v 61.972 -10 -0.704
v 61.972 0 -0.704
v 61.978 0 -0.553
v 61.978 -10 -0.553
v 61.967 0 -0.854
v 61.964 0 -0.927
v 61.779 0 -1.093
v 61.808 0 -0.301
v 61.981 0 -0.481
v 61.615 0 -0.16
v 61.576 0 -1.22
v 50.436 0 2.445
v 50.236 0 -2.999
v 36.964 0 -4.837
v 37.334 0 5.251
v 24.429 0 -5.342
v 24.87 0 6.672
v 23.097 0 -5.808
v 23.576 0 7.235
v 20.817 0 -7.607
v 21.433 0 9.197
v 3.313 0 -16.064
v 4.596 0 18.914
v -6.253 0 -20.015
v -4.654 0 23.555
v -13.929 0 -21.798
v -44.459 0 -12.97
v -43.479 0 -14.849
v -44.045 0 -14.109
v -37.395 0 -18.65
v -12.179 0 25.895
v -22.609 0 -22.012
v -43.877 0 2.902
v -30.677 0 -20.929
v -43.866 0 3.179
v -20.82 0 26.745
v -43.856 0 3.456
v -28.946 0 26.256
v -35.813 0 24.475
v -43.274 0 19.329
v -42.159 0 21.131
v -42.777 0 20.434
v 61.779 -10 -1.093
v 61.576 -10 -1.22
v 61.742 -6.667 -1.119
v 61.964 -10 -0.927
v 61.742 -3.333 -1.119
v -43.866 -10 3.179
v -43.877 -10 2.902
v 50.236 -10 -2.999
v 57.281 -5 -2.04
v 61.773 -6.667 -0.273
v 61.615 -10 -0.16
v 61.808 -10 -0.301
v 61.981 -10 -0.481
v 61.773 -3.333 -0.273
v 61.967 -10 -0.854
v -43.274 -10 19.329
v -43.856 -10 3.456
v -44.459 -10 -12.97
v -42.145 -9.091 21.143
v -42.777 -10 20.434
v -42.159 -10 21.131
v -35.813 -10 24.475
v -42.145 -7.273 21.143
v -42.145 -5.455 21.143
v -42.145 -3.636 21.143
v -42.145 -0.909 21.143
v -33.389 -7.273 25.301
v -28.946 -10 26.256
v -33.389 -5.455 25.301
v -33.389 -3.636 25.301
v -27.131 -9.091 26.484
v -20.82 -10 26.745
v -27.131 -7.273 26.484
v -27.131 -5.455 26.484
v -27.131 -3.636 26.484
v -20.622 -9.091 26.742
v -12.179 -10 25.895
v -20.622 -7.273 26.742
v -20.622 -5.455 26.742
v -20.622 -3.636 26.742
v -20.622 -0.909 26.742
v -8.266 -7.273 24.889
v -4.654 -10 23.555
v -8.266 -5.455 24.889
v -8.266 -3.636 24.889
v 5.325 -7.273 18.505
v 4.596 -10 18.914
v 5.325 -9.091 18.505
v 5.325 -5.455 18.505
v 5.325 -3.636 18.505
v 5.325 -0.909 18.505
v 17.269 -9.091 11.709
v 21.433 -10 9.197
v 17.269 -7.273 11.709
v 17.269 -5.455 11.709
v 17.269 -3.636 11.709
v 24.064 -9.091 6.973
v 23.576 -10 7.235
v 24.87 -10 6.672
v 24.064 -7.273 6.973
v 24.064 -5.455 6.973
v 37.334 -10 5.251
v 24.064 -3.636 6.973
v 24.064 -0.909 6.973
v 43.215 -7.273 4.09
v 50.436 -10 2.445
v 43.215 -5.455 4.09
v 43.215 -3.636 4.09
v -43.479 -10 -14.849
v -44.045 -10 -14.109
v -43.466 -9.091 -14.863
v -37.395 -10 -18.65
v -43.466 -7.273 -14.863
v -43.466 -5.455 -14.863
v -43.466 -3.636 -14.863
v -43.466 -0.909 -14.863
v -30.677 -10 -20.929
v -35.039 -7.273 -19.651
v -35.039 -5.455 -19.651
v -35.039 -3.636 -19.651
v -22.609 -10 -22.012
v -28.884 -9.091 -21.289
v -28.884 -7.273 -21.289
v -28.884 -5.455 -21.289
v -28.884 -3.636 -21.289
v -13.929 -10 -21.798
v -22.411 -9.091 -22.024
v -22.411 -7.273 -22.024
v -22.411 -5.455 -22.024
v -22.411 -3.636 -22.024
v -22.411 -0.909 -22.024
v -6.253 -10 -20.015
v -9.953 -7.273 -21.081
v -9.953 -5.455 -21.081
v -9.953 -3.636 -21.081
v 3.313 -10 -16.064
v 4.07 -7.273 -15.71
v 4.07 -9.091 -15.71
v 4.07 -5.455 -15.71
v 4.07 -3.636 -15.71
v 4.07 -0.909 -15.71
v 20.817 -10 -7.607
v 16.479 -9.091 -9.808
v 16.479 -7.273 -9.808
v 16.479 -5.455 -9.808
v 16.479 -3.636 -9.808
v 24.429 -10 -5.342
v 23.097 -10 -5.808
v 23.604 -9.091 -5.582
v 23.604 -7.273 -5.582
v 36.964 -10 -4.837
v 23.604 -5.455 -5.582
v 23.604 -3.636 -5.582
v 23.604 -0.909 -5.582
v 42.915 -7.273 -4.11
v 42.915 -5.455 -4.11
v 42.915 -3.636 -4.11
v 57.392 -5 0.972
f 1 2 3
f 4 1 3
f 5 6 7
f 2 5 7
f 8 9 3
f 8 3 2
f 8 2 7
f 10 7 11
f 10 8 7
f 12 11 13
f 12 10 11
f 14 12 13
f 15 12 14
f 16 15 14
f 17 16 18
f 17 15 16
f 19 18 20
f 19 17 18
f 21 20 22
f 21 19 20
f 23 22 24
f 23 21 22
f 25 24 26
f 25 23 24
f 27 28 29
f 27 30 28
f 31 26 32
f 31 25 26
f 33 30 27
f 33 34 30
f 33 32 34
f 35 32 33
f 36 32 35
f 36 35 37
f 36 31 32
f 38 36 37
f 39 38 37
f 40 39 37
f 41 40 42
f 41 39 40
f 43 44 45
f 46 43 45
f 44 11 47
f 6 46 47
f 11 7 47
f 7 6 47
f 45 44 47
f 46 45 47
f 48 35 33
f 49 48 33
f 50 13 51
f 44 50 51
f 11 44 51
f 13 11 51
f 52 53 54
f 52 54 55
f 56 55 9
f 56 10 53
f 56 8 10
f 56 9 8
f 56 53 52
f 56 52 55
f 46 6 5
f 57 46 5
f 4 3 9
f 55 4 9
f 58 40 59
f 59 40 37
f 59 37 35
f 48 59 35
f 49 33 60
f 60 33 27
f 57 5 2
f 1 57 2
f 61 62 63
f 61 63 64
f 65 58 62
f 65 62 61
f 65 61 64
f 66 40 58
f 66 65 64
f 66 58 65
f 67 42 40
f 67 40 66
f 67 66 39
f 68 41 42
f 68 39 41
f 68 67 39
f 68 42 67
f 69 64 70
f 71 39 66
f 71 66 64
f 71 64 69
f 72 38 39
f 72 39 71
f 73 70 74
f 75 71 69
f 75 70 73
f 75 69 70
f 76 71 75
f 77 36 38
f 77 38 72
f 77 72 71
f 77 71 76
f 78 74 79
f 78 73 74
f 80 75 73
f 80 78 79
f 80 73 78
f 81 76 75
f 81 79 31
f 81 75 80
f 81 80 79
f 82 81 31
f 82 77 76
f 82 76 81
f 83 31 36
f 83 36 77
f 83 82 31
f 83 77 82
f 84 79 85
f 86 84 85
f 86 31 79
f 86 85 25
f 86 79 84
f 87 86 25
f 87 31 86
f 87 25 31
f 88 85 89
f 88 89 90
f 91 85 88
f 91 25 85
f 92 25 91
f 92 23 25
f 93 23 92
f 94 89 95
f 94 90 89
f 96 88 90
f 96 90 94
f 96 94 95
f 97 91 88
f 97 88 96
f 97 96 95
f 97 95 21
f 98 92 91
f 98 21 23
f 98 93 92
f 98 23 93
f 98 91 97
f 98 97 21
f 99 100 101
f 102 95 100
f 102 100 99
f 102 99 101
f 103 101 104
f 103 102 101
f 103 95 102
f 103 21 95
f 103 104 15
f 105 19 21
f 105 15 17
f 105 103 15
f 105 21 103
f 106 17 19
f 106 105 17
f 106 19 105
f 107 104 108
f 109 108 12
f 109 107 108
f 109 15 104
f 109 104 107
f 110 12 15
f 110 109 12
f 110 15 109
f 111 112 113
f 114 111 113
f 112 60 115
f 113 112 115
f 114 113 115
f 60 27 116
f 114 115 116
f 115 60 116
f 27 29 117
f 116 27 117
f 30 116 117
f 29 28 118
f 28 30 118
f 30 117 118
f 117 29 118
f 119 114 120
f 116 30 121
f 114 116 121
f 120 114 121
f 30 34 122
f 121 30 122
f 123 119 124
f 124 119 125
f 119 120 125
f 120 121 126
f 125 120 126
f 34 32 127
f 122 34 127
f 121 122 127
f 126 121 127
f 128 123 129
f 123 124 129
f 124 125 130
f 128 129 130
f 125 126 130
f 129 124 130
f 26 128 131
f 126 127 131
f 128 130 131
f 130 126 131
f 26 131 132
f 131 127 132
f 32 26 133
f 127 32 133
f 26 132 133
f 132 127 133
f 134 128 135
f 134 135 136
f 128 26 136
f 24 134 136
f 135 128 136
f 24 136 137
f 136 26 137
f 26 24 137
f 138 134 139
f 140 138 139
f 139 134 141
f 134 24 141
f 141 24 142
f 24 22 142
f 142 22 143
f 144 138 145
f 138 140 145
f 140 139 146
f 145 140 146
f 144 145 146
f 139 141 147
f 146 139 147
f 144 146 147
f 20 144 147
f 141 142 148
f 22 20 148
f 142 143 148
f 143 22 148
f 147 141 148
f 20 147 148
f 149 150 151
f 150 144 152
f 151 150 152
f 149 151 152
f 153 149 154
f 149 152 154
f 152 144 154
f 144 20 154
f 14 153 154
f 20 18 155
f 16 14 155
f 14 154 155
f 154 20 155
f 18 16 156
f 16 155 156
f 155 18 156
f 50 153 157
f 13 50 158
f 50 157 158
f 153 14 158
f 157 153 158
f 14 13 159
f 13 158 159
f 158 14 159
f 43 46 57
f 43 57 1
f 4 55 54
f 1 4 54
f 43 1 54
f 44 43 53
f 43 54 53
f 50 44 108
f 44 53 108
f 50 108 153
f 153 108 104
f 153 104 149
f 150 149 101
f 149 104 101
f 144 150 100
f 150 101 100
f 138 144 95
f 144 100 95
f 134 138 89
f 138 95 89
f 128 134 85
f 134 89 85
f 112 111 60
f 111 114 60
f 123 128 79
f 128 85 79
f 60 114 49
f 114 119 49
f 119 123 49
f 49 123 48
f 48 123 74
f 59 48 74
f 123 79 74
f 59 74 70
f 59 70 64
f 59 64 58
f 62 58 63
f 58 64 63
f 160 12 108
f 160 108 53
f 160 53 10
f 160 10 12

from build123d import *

# Parameters (mm, degrees)
F1_DEPTH = 10


with BuildPart() as f1:
    # F0 (on Front) → F1 (new body)
    with BuildSketch(Plane.XZ):
        with BuildLine():
            add(Edge.make_bspline(
                [(-43.2739737539, 19.3286379981), (-42.8717910323, 20.6443938488), (-41.2670866914, 21.9607246818), (-33.1050259673, 26.1698144492), (-20.4782941502, 27.1660016518), (-7.9180102102, 25.6432503479), (5.0492344453, 18.8178845805), (16.8426971438, 11.7818486723), (21.5410823221, 9.5845389909), (23.7573944562, 6.0271395456), (33.9663222046, 6.0122157554), (41.6732644409, 4.4779816736), (47.9916737559, 2.9982979686), (50.4361293155, 2.4450533648)],
                knots=[0.2096114324, 0.2096114324, 0.2096114324, 0.2096114324, 0.2372253632, 0.282305002, 0.3374939232, 0.3919156422, 0.4515775986, 0.5086523402, 0.5423950946, 0.5712274702, 0.6183035523, 0.6670425092, 0.6989923434, 0.6989923434, 0.6989923434, 0.6989923434], degree=3))
            Line((-43.2739737539, 19.3286379981), (-43.8562949661, 3.456262298))
            Line((-43.8562949661, 3.456262298), (-43.866463093, 3.1791088515))
            Line((-43.866463093, 3.1791088515), (61.9723973752, -0.7038772044))
            Line((61.9723973752, -0.7038772044), (61.9779187996, -0.5533792985))
            add(Edge.make_bspline(
                [(61.9779187996, -0.5533792985), (61.9043423038, -0.4347153333), (61.7777869789, -0.2956526047), (61.614568699, -0.1598779548)],
                knots=[0.7844933866, 0.7844933866, 0.7844933866, 0.7844933866, 0.7922828741, 0.7922828741, 0.7922828741, 0.7922828741], degree=3))
            add(Edge.make_bspline(
                [(50.4361293155, 2.4450533648), (52.1557640437, 2.0558547843), (56.6990812586, 1.0537255108), (60.587418179, 0.4072656539), (61.5305184171, -0.106596957), (61.614568699, -0.1598779548)],
                knots=[0.6989923434, 0.6989923434, 0.6989923434, 0.6989923434, 0.7214685321, 0.7593724987, 0.7638050529, 0.7638050529, 0.7638050529, 0.7638050529], degree=3))
        make_face()
        with BuildLine():
            Line((-43.866463093, 3.1791088515), (-43.8766312199, 2.9019554051))
            Line((-43.8766312199, 2.9019554051), (-44.4589524321, -12.9704202951))
            add(Edge.make_bspline(
                [(-44.4589524321, -12.9704202951), (-44.1542653031, -14.3121095861), (-42.650331497, -15.7424892526), (-34.8186419571, -20.5383531877), (-22.2988527346, -22.4571088129), (-9.6607529946, -21.8588286533), (3.7717720363, -16.0020101391), (16.0491078911, -9.8490768524), (20.8958739527, -8.001956969), (23.366902701, -4.6165253548), (33.5494787592, -5.3497192653), (41.3481257392, -4.3843498373), (47.757975395, -3.3716368828), (50.2363993771, -2.9990014855)],
                knots=[0.2096114324, 0.2096114324, 0.2096114324, 0.2096114324, 0.2372253632, 0.282305002, 0.3374939232, 0.3919156422, 0.4515775986, 0.5086523402, 0.5423950946, 0.5712274702, 0.6183035523, 0.6670425092, 0.6989923434, 0.6989923434, 0.6989923434, 0.6989923434], degree=3))
            add(Edge.make_bspline(
                [(50.2363993771, -2.9990014855), (51.9799303381, -2.7368585443), (56.5844663162, -2.0703431109), (60.5097205041, -1.7105460656), (61.4879395595, -1.2671722713), (61.5756681453, -1.2201934479)],
                knots=[0.6989923434, 0.6989923434, 0.6989923434, 0.6989923434, 0.7214685321, 0.7593724987, 0.7638050529, 0.7638050529, 0.7638050529, 0.7638050529], degree=3))
            add(Edge.make_bspline(
                [(61.9668759507, -0.8543751103), (61.884801939, -0.9673286138), (61.7483967681, -1.0967439225), (61.5756681453, -1.2201934479)],
                knots=[0.7844933866, 0.7844933866, 0.7844933866, 0.7844933866, 0.7922828741, 0.7922828741, 0.7922828741, 0.7922828741], degree=3))
            Line((61.9668759507, -0.8543751103), (61.9723973752, -0.7038772044))
            Line((61.9723973752, -0.7038772044), (-43.866463093, 3.1791088515))
        make_face()
        with BuildLine():
            add(Edge.make_bspline(
                [(61.614568699, -0.1598779548), (61.7949898213, -0.2742501756), (61.9077194324, -0.3862288488), (61.9805835524, -0.4807459177)],
                knots=[0.7638050529, 0.7638050529, 0.7638050529, 0.7638050529, 0.7733199098, 0.7733199098, 0.7733199098, 0.7733199098], degree=3))
            add(Edge.make_bspline(
                [(61.9779187996, -0.5533792985), (61.9043423038, -0.4347153333), (61.7777869789, -0.2956526047), (61.614568699, -0.1598779548)],
                knots=[0.7844933866, 0.7844933866, 0.7844933866, 0.7844933866, 0.7922828741, 0.7922828741, 0.7922828741, 0.7922828741], degree=3))
            Line((61.9779187996, -0.5533792985), (61.9805835524, -0.4807459177))
        make_face()
        with BuildLine():
            Line((61.9642111979, -0.9270084911), (61.9668759507, -0.8543751103))
            add(Edge.make_bspline(
                [(61.9668759507, -0.8543751103), (61.884801939, -0.9673286138), (61.7483967681, -1.0967439225), (61.5756681453, -1.2201934479)],
                knots=[0.7844933866, 0.7844933866, 0.7844933866, 0.7844933866, 0.7922828741, 0.7922828741, 0.7922828741, 0.7922828741], degree=3))
            add(Edge.make_bspline(
                [(61.5756681453, -1.2201934479), (61.7639850615, -1.1193493835), (61.8846170541, -1.0159322145), (61.9642111979, -0.9270084911)],
                knots=[0.7638050529, 0.7638050529, 0.7638050529, 0.7638050529, 0.7733199098, 0.7733199098, 0.7733199098, 0.7733199098], degree=3))
        make_face()
    extrude(amount=F1_DEPTH)


solid = f1.part
